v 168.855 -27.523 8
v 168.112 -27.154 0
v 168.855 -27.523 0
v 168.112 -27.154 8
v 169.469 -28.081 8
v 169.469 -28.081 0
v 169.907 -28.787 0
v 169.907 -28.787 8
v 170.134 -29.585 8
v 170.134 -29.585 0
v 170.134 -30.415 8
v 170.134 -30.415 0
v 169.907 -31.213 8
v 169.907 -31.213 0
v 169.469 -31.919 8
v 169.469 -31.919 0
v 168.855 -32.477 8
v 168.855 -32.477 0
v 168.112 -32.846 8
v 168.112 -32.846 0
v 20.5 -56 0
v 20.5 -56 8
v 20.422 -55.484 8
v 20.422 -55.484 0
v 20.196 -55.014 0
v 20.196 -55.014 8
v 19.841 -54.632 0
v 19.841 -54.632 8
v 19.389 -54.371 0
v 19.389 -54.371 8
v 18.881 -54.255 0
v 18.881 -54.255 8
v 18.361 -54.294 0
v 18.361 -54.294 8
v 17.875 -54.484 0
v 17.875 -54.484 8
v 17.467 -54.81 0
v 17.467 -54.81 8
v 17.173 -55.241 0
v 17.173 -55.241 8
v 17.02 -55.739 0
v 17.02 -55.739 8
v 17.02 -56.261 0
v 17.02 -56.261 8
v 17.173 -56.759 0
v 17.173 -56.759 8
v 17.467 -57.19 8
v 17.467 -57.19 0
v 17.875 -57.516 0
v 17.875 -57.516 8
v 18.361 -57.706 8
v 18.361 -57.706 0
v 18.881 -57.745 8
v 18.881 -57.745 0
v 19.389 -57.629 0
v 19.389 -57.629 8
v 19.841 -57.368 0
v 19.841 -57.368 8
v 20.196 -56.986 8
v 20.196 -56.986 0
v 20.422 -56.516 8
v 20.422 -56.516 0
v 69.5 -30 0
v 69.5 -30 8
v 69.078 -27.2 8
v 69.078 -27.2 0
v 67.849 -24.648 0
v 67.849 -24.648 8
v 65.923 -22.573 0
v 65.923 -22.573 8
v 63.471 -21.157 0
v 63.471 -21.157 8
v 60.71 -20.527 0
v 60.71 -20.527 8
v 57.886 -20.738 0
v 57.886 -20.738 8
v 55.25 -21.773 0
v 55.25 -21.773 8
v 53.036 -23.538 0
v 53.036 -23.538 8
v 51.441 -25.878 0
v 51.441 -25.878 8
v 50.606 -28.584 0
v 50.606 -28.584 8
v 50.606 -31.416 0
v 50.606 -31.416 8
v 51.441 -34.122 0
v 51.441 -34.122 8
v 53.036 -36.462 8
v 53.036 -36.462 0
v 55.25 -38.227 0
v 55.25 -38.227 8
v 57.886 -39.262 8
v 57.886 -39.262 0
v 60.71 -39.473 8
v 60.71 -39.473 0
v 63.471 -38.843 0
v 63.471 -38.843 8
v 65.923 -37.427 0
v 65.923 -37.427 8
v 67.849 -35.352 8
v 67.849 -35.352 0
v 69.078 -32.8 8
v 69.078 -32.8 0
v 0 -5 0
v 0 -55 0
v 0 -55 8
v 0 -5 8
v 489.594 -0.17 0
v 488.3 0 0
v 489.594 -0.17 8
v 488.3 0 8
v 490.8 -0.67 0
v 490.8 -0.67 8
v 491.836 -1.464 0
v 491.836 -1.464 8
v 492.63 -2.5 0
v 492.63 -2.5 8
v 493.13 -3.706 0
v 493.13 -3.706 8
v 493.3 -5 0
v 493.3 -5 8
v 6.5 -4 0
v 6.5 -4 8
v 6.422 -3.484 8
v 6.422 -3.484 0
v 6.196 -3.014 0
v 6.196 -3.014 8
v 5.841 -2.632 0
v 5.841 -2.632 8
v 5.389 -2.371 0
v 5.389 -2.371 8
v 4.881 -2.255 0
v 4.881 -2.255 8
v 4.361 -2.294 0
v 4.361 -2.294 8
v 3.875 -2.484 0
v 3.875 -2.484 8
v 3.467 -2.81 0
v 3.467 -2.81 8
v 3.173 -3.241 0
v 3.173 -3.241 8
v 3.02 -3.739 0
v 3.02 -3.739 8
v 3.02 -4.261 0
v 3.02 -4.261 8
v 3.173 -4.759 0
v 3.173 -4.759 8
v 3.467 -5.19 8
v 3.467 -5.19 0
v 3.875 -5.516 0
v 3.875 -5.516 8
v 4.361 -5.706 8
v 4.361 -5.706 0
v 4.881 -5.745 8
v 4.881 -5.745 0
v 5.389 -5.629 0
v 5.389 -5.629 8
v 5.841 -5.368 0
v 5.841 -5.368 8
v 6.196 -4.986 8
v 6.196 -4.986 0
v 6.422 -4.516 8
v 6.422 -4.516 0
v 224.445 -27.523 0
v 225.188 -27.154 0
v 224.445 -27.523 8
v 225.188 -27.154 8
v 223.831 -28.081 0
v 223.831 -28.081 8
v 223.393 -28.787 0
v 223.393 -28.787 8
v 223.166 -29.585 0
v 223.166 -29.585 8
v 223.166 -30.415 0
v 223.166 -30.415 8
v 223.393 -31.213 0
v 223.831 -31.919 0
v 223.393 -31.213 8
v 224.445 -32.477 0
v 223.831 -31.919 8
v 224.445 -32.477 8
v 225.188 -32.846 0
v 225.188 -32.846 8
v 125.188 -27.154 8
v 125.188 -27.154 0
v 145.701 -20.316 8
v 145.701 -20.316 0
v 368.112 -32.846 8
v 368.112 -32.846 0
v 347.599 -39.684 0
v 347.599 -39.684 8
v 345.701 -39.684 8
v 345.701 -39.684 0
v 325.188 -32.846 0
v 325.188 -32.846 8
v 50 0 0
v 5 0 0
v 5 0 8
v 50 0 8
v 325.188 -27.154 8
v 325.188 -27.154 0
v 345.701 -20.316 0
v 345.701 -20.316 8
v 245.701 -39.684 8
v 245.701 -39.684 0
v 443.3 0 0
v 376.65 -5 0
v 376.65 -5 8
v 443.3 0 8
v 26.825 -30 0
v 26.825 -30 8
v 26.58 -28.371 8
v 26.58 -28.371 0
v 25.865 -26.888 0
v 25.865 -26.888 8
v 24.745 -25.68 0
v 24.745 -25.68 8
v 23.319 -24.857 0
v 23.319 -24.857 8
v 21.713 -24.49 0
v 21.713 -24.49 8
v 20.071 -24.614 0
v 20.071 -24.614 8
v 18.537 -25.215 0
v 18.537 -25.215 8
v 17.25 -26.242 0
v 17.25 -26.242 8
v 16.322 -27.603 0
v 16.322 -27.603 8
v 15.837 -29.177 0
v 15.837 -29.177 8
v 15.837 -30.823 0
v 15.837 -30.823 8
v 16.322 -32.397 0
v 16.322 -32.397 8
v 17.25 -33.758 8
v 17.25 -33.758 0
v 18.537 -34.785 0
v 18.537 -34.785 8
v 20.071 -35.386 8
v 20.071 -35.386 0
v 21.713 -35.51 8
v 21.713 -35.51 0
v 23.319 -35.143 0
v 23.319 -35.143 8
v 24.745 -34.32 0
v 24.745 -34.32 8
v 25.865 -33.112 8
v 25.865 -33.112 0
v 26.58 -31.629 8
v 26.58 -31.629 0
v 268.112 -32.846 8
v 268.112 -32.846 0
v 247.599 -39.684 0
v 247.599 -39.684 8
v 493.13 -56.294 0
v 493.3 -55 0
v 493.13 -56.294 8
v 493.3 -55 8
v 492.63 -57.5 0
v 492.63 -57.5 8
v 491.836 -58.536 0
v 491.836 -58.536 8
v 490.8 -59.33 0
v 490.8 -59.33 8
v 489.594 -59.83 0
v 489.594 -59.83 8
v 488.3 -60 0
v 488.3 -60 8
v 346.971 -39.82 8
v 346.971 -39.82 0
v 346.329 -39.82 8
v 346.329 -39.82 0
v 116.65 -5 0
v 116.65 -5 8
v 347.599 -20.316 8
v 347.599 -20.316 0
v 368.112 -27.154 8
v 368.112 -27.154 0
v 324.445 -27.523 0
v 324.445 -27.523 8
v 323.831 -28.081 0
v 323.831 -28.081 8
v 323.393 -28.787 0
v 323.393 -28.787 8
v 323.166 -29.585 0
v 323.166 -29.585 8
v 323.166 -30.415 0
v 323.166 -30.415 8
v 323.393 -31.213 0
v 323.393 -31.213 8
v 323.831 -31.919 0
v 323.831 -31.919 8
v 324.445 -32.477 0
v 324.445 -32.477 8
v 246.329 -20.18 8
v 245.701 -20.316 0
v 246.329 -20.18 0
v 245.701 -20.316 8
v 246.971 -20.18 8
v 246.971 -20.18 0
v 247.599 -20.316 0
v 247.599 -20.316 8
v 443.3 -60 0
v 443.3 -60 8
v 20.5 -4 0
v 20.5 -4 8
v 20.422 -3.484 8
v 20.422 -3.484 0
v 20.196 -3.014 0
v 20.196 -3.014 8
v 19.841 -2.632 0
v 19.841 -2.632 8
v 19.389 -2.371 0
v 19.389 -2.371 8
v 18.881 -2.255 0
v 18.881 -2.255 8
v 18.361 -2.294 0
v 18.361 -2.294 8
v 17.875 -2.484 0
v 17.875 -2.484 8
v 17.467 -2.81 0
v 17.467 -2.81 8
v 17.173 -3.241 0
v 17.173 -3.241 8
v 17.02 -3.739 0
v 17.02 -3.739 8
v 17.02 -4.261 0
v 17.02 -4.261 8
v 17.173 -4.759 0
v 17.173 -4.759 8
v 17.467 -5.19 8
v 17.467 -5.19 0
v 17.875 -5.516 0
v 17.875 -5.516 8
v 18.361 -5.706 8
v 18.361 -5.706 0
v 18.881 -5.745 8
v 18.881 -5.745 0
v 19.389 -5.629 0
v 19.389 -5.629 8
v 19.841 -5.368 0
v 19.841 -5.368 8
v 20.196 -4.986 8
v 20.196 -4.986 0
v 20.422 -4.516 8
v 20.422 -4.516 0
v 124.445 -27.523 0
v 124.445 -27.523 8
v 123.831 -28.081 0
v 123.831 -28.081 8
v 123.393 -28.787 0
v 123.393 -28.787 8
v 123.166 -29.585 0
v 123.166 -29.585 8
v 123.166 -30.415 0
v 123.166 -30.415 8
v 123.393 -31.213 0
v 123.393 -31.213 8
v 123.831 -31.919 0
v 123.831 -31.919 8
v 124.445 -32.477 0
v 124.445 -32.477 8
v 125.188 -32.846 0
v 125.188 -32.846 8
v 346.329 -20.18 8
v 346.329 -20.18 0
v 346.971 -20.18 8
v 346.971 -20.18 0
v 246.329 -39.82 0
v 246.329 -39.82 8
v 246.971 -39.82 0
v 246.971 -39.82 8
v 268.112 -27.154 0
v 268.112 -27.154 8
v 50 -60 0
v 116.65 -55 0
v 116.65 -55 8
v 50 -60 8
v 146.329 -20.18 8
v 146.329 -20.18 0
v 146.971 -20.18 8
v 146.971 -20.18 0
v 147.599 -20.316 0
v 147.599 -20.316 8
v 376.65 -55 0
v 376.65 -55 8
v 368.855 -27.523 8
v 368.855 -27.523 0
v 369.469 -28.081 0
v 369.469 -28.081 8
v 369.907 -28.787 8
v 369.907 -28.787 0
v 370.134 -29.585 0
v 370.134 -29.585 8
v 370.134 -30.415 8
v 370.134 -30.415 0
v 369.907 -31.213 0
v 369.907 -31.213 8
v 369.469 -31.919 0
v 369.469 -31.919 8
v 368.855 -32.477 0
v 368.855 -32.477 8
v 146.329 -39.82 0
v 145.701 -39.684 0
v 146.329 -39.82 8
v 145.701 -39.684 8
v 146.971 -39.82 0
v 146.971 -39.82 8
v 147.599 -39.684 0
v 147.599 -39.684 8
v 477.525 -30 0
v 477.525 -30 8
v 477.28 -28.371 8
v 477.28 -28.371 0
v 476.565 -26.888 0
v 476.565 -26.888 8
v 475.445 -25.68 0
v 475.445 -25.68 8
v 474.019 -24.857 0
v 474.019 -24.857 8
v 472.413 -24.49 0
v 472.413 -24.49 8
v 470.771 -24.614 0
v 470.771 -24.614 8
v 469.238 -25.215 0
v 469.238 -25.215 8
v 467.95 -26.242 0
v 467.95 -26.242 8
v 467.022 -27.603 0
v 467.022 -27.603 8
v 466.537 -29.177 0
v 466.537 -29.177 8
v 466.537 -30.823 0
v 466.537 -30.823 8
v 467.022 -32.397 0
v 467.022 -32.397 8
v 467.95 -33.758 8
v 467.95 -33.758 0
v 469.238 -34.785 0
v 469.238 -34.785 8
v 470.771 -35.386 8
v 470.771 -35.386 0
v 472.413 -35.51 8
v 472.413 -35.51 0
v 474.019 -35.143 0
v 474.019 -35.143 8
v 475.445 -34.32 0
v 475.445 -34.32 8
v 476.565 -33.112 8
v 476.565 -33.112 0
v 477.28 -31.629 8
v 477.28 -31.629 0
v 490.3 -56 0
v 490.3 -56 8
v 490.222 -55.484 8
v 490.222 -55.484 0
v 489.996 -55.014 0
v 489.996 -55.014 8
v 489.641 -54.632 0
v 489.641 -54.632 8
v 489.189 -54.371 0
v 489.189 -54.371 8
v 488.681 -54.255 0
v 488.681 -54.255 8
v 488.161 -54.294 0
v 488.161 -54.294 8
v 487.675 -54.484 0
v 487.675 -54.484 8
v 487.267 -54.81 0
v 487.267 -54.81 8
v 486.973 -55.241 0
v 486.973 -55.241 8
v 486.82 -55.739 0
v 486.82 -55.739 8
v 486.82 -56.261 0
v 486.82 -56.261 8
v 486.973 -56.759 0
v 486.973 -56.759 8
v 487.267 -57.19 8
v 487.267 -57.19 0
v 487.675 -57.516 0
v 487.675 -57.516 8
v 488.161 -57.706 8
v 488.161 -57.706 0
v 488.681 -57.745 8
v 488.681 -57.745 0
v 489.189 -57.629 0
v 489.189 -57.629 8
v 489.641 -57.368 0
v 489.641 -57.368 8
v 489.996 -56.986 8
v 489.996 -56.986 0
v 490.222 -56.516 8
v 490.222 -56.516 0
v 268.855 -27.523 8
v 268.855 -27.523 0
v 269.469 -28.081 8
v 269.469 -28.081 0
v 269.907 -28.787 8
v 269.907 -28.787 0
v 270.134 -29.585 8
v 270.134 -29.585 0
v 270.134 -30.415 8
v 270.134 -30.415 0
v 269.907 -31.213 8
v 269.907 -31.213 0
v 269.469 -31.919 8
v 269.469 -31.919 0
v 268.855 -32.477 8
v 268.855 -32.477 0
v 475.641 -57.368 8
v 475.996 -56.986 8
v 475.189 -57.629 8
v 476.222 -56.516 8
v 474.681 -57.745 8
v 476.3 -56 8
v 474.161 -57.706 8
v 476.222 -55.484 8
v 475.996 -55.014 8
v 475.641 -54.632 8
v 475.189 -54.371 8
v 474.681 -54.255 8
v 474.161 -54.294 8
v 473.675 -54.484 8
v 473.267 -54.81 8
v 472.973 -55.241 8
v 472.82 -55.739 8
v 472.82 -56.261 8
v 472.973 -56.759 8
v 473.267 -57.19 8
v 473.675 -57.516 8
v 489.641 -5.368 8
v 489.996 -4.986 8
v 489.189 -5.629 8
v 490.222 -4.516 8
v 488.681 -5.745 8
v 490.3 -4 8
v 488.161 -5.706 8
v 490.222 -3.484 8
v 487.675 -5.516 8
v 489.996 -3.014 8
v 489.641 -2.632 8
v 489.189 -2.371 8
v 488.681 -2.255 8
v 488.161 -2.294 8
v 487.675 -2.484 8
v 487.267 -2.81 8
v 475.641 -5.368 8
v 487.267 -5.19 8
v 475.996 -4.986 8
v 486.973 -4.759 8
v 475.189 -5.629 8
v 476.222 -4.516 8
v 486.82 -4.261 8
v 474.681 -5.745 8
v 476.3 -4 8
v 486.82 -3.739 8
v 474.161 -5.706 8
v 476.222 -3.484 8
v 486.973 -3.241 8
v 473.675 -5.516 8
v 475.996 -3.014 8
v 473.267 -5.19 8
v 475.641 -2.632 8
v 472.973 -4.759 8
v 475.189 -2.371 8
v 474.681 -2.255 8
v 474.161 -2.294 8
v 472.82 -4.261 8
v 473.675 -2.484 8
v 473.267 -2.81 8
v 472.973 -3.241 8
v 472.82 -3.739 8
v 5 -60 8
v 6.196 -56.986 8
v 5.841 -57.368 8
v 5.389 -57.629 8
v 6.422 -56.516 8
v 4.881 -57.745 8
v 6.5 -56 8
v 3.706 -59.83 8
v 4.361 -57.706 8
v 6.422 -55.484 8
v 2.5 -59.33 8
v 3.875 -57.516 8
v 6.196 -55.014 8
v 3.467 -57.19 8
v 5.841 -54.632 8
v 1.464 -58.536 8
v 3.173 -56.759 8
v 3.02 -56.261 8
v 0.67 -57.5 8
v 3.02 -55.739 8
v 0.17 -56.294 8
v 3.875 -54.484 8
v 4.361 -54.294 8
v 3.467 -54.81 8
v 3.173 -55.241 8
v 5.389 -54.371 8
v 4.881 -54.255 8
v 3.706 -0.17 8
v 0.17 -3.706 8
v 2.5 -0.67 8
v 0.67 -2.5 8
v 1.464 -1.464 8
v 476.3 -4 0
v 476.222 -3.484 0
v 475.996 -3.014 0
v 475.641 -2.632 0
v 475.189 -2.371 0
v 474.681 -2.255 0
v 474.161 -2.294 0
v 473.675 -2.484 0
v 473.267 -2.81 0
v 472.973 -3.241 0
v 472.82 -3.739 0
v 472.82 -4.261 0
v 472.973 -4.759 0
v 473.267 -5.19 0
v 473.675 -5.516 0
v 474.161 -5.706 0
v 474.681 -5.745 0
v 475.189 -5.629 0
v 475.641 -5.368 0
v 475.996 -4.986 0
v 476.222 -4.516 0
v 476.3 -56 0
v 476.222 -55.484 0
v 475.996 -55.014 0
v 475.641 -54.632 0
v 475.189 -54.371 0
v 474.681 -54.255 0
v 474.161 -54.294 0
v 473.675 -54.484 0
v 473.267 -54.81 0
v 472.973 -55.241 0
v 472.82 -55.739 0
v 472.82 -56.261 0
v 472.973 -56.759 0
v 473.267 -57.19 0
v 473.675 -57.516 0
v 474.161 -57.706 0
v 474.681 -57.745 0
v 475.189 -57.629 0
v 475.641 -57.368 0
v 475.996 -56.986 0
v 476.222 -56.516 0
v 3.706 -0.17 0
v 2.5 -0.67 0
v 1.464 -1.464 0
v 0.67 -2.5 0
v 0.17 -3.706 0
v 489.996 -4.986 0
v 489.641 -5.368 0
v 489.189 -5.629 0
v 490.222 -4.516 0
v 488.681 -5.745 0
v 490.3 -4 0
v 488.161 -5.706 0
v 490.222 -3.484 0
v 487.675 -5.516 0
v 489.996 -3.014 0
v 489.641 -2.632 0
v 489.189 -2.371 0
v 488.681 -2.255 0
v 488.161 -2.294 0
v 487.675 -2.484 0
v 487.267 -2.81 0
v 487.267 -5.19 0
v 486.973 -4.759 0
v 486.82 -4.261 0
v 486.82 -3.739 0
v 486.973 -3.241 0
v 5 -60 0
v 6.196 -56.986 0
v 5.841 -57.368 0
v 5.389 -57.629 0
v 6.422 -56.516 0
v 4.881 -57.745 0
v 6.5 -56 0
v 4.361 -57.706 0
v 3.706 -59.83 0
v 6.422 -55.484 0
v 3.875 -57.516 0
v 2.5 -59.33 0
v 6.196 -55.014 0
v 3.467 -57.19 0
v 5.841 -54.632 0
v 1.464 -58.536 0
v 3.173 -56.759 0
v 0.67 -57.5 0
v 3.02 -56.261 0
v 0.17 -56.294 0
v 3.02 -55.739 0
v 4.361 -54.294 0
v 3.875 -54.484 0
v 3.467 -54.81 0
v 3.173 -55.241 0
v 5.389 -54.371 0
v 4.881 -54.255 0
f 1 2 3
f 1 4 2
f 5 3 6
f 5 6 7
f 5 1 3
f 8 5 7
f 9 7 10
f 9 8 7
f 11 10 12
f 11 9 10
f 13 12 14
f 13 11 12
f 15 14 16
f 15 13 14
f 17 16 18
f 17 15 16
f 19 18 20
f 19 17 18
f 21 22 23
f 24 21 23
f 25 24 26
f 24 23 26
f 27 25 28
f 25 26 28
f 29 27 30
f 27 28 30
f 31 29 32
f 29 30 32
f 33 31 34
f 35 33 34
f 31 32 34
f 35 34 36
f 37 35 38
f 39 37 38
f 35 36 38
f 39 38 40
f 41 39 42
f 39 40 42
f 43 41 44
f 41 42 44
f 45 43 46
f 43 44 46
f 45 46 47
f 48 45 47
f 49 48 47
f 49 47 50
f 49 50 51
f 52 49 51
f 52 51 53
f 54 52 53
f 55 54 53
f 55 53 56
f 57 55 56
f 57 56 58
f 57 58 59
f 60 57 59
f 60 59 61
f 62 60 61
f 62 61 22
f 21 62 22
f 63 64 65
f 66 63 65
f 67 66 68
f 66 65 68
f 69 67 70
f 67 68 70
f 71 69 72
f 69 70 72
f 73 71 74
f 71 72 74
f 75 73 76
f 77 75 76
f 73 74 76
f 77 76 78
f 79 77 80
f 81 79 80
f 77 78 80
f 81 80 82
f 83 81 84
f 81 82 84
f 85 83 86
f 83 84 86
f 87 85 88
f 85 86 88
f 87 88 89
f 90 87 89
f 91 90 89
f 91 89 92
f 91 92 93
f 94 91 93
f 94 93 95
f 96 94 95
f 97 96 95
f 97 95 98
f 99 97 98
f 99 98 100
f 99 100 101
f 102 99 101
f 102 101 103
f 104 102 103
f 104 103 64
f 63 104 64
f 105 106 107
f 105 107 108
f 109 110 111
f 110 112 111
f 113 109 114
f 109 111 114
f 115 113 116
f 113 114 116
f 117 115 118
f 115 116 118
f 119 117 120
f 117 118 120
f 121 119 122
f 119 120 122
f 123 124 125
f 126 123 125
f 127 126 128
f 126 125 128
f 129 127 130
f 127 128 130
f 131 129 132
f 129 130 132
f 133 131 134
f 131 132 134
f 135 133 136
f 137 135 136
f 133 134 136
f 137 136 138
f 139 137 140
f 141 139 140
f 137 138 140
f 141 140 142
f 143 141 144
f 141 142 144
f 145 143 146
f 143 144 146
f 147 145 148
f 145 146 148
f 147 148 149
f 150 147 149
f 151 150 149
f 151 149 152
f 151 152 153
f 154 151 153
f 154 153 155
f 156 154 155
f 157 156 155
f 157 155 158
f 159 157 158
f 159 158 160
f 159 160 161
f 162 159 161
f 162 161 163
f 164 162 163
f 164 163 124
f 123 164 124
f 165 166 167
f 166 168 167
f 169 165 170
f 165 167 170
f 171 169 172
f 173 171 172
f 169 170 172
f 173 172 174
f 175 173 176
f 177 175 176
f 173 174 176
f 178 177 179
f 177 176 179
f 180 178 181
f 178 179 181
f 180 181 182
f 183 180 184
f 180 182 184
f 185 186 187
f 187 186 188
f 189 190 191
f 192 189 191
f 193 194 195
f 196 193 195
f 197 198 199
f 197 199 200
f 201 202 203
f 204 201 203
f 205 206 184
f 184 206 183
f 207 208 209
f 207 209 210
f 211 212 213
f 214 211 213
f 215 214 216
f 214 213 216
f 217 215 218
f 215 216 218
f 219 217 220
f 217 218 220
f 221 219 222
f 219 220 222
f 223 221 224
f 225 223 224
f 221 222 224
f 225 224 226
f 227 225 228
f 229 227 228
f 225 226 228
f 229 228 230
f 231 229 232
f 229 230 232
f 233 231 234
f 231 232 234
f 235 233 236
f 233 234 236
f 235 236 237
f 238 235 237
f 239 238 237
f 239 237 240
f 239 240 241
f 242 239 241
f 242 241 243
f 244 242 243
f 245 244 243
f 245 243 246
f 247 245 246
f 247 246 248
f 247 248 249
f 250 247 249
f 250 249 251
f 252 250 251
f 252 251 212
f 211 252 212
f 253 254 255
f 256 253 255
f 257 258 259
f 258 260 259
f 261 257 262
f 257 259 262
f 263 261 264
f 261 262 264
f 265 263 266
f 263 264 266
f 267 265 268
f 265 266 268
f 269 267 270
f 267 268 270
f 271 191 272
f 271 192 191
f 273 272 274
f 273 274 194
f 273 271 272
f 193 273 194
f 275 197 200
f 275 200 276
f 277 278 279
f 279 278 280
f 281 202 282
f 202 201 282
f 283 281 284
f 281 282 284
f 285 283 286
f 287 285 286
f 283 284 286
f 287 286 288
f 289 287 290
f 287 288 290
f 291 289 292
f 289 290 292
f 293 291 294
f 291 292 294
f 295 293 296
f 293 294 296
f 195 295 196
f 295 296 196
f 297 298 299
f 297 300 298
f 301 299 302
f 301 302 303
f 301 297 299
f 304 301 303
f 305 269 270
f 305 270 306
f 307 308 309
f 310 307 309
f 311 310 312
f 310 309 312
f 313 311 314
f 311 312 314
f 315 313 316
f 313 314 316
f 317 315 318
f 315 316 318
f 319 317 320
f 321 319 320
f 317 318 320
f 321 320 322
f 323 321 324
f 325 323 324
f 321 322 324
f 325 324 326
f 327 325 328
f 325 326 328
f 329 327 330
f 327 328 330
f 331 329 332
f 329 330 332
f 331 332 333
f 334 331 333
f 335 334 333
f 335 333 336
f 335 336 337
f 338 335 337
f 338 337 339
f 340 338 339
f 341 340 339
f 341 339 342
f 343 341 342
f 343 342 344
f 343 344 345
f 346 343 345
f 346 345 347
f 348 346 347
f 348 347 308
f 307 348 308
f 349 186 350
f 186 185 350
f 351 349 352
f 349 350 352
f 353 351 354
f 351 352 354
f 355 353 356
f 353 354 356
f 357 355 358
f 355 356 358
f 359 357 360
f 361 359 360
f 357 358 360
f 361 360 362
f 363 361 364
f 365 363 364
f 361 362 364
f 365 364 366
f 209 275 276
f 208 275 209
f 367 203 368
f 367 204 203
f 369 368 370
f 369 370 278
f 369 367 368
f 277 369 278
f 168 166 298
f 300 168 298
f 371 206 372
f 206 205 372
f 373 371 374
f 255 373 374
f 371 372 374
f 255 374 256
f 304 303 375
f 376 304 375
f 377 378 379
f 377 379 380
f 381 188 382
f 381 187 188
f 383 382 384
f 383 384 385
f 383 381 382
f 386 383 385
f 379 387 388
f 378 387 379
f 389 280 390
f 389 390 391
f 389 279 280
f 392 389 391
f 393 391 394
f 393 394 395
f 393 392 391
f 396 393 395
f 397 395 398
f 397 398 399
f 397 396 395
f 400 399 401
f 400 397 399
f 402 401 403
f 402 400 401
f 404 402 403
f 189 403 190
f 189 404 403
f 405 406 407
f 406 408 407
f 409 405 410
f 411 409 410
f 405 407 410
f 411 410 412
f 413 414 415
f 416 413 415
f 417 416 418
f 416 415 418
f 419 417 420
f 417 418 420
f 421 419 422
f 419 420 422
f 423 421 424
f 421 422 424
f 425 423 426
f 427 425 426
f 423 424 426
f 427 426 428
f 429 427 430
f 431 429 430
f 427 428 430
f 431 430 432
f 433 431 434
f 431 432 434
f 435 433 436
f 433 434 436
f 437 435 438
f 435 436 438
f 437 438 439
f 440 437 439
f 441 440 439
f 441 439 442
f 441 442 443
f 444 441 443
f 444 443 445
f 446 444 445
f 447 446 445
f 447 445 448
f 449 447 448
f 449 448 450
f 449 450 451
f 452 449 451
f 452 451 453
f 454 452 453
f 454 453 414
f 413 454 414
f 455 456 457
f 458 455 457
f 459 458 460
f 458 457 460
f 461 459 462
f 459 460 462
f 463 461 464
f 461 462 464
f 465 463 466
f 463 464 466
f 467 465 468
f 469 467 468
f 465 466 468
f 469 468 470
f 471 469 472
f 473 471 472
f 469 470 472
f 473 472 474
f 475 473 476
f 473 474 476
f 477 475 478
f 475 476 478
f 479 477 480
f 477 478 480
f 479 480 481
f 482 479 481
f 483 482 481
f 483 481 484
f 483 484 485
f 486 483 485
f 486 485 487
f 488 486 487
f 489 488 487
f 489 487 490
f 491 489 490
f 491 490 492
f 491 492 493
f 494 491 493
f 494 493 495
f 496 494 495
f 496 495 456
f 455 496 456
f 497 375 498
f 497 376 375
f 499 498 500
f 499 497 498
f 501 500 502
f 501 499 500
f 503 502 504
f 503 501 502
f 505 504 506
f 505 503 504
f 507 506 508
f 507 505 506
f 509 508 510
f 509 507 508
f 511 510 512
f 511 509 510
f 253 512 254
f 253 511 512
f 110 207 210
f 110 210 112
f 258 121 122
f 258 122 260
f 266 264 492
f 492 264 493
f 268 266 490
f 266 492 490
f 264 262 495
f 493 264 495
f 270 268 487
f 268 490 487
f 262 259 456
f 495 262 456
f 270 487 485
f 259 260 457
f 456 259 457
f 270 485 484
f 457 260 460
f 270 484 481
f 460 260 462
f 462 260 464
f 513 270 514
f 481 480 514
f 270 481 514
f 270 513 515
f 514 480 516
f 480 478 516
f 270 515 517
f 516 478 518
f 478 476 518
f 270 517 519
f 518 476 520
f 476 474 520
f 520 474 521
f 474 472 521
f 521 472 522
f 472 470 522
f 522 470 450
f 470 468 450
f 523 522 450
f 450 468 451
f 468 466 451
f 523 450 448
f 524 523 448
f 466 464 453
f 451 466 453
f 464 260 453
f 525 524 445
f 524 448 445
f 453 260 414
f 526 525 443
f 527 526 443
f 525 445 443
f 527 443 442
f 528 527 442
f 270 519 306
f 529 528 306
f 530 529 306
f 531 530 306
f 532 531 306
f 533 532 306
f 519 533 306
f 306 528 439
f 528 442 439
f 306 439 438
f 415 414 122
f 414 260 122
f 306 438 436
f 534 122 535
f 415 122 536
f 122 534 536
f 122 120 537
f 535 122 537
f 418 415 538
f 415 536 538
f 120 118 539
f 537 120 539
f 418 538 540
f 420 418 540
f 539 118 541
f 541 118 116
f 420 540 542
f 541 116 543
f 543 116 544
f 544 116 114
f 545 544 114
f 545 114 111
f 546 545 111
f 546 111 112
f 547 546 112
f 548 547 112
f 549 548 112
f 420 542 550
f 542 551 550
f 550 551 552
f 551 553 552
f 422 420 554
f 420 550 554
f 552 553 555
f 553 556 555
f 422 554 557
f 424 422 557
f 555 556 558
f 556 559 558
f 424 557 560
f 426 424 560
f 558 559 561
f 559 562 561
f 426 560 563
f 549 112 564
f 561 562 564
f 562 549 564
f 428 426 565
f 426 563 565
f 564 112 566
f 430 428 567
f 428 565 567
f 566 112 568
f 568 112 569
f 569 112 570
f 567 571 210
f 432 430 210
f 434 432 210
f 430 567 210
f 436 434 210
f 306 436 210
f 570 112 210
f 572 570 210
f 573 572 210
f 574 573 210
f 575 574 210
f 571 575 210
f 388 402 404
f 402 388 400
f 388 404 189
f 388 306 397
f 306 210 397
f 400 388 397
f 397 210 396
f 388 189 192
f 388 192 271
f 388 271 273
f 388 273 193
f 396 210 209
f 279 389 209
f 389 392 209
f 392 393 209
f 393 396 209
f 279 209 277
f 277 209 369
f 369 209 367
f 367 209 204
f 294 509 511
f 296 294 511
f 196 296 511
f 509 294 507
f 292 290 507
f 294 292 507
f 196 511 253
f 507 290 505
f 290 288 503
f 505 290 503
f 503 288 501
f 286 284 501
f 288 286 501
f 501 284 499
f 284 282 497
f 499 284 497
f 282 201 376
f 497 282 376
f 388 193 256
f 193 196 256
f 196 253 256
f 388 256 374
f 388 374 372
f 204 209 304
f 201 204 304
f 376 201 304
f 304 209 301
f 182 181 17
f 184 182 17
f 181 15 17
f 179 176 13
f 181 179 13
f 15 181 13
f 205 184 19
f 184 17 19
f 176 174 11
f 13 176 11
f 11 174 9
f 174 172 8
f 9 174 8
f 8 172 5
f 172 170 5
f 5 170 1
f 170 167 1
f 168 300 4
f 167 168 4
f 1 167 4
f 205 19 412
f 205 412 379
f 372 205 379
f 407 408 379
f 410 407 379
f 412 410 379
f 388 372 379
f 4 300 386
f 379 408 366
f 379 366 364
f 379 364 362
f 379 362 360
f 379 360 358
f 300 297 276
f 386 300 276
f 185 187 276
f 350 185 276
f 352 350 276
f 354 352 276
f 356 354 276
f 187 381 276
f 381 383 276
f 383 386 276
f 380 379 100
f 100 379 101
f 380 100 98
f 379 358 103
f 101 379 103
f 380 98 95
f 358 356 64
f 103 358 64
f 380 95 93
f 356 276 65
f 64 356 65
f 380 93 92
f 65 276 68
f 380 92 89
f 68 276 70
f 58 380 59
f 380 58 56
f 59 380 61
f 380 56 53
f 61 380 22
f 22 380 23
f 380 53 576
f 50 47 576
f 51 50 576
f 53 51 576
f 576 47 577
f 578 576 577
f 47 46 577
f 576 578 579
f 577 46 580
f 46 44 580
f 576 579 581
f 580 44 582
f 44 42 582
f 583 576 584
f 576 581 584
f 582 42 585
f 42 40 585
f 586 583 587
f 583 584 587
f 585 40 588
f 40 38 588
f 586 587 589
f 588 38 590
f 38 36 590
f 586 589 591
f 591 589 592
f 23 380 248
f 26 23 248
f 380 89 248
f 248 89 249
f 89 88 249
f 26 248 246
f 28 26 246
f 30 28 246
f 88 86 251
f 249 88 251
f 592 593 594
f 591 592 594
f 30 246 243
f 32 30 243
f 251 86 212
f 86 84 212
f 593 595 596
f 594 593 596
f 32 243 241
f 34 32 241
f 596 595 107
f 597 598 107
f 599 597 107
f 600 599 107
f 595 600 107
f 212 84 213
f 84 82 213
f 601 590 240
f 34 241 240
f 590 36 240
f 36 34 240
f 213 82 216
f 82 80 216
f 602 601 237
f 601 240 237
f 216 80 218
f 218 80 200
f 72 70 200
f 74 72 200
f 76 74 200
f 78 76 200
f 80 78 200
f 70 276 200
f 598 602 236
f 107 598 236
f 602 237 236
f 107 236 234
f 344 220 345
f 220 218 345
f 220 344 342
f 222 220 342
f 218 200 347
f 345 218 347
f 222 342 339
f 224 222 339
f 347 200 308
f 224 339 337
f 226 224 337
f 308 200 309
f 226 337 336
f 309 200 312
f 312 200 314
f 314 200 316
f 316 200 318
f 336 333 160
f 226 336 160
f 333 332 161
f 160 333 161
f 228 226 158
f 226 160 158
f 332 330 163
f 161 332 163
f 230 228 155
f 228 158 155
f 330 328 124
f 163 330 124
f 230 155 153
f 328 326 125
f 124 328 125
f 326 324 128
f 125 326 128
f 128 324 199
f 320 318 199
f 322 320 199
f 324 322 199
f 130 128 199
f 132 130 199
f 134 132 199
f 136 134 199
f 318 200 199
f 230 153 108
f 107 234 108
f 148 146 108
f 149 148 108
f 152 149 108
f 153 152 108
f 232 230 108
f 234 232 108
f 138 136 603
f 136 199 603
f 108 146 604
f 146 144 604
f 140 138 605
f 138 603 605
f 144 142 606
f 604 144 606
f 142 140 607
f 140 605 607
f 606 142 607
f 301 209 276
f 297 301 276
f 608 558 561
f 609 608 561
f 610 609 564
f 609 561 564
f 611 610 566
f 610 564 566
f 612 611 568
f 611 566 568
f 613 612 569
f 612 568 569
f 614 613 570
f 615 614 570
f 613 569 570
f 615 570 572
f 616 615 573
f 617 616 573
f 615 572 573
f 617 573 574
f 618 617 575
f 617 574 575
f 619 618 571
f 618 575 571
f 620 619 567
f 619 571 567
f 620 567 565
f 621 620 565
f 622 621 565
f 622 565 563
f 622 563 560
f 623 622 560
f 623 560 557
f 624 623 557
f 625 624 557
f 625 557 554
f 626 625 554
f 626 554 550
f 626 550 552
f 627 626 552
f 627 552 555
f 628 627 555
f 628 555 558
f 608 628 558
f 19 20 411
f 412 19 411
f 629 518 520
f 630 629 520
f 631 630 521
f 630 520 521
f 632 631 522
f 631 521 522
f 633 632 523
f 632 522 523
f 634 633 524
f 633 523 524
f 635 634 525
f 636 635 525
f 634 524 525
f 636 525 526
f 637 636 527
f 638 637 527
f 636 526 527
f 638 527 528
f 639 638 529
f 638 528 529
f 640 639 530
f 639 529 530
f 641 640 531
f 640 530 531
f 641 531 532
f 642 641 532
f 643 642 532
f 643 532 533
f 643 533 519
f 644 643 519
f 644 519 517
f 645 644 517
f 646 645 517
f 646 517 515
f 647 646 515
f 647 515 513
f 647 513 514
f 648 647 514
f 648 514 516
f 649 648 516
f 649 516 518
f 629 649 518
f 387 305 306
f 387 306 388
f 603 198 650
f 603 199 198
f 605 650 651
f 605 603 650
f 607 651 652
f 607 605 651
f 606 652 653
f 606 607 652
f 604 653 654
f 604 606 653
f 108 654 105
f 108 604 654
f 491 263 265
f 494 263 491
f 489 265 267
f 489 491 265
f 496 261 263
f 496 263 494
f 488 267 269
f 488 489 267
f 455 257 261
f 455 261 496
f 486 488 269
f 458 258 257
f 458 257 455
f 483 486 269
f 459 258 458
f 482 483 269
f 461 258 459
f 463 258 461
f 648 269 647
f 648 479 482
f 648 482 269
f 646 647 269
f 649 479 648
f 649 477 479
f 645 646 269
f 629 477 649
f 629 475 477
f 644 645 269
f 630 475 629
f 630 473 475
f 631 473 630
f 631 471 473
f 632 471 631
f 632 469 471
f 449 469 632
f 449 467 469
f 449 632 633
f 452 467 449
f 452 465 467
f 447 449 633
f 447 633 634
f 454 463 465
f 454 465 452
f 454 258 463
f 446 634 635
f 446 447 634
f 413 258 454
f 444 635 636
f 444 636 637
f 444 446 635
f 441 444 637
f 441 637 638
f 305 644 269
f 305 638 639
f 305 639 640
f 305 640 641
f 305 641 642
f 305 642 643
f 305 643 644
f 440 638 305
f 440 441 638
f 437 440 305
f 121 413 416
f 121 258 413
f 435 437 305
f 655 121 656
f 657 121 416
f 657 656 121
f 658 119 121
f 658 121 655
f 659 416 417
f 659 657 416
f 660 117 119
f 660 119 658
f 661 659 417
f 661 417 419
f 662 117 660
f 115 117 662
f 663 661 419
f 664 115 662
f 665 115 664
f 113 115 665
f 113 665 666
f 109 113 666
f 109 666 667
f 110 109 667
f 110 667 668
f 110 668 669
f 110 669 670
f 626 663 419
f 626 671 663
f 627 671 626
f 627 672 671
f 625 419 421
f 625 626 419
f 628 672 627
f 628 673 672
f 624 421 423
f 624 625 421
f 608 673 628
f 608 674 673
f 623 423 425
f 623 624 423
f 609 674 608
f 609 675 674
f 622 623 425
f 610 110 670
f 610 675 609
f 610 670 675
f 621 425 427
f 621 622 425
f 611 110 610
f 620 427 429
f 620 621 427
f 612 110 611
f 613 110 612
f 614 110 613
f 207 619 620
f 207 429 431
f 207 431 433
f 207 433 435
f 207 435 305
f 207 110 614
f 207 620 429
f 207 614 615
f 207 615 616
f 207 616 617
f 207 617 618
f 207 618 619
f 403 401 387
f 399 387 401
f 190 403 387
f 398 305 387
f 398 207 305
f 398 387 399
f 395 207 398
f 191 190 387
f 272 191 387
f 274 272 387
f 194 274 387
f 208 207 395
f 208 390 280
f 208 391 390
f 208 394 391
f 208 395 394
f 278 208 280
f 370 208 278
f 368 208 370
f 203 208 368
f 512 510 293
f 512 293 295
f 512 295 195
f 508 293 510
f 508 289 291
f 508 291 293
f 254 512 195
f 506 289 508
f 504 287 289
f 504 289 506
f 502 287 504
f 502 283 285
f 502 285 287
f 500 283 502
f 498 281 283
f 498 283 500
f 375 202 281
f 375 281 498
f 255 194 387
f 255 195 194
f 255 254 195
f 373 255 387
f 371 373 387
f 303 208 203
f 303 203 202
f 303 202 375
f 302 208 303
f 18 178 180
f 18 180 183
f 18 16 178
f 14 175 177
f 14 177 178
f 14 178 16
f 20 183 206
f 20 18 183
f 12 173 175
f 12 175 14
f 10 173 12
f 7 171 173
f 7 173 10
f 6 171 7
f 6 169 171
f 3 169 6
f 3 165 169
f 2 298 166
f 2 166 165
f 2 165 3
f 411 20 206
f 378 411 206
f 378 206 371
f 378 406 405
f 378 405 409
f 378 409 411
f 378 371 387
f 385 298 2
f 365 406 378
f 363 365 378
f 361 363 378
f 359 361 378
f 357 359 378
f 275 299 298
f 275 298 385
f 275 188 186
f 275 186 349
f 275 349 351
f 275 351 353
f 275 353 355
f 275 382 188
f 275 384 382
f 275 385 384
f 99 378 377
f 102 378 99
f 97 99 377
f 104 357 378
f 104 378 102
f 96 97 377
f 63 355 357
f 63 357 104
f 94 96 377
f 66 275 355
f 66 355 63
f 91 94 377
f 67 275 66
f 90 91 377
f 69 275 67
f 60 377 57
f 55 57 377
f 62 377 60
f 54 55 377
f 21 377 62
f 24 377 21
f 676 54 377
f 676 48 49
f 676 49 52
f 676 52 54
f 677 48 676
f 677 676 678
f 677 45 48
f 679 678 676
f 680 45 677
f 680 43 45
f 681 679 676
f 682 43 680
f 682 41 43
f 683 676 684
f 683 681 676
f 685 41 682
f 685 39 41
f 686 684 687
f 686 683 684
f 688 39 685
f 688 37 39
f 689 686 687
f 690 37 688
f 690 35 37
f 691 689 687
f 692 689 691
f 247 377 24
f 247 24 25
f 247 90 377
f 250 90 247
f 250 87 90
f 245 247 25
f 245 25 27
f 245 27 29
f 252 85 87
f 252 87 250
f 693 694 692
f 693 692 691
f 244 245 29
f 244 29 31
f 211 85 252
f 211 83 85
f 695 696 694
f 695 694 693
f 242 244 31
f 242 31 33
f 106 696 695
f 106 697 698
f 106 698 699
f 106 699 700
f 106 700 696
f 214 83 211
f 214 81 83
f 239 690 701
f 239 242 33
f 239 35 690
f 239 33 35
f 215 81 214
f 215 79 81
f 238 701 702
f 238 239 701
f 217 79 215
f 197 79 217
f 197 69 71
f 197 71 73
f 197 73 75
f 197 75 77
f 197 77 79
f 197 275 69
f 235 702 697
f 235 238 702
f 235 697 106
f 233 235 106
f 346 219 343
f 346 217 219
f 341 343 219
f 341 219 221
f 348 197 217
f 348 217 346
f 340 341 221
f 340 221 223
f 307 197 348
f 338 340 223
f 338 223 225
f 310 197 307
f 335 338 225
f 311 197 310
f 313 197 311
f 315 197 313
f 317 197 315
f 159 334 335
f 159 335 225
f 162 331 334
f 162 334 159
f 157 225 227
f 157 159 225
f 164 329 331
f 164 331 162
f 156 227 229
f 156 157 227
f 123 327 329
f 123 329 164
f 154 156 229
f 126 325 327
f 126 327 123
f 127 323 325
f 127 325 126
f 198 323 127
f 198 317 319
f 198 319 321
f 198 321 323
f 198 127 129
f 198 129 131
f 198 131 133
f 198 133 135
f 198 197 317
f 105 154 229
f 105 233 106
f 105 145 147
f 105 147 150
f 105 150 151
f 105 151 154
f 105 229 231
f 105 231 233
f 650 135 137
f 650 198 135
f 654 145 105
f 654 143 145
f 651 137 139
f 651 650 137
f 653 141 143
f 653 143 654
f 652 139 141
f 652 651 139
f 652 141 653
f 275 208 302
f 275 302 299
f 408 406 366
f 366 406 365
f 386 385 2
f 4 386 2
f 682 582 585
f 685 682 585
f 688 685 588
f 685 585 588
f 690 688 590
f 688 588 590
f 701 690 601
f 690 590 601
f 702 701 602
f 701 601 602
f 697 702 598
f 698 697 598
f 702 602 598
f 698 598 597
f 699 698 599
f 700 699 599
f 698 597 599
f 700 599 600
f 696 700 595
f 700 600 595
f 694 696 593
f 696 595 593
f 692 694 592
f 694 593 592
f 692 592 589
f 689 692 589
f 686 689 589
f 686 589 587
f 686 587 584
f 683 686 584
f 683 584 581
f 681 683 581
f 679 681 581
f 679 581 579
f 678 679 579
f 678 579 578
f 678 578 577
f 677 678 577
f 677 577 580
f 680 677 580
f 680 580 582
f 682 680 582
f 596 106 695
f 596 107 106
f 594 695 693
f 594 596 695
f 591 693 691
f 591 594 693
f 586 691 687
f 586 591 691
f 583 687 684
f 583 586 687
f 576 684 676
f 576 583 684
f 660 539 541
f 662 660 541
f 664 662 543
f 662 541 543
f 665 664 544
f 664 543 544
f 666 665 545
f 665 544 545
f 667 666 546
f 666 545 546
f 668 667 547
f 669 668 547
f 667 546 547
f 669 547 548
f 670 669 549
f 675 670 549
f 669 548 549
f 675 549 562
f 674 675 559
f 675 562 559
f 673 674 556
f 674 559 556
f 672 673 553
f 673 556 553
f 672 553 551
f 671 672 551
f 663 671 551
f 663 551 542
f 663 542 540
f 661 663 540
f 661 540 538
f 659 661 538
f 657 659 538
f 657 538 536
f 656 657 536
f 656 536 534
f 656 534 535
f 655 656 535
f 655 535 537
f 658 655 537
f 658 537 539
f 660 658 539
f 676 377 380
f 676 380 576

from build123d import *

# Parameters (mm, degrees)
EXTRUDE_1_DEPTH     = 8
FILLET_1_R          = 3
FILLET_2_R          = 5
SKETCH_2_R          = 1.75
SKETCH_2_R_2        = 5.525
CUT_EXTRUDE_1_DEPTH = 10
SKETCH_3_R          = 9.5
CUT_EXTRUDE_2_DEPTH = 497.999889336


with BuildPart() as part:
    # 草图1 → 凸台-拉伸1 (new body)
    with BuildSketch(Plane.XY):
        Polygon((0, 0), (50, 0), (116.65, -5), (376.65, -5), (443.3, 0), (493.3, 0), (493.3, -60), (443.3, -60), (376.65, -55), (116.65, -55), (50, -60), (0, -60), align=None)
        Polygon((116.65, -30), (146.65, -20), (176.65, -30), (146.65, -40), align=None, mode=Mode.SUBTRACT)
        Polygon((216.65, -30), (246.65, -20), (276.65, -30), (246.65, -40), align=None, mode=Mode.SUBTRACT)
        Polygon((316.65, -30), (346.65, -20), (376.65, -30), (346.65, -40), align=None, mode=Mode.SUBTRACT)
    extrude(amount=EXTRUDE_1_DEPTH)

    # 圆角1
    fillet_1_edges = [part.edges().sort_by_distance(p)[0] for p in [
        (216.65, -30, 4),
        (246.65, -40, 4),
        (276.65, -30, 4),
        (246.65, -20, 4),
        (116.65, -30, 4),
        (146.65, -40, 4),
        (176.65, -30, 4),
        (146.65, -20, 4),
        (316.65, -30, 4),
        (346.65, -40, 4),
        (376.65, -30, 4),
        (346.65, -20, 4),
    ]]
    fillet(fillet_1_edges, radius=FILLET_1_R)

    # 圆角2
    fillet_2_edges = [part.edges().sort_by_distance(p)[0] for p in [
        (0, 0, 4),
        (493.3, 0, 4),
        (493.3, -60, 4),
        (0, -60, 4),
    ]]
    fillet(fillet_2_edges, radius=FILLET_2_R)

    # 草图2 → 切除-拉伸1 (cut)
    with BuildSketch(Plane.XY.offset(8)):
        with Locations((4.75, -4)):
            Circle(SKETCH_2_R)
        with Locations((18.75, -4)):
            Circle(SKETCH_2_R)
        with Locations((18.75, -56)):
            Circle(SKETCH_2_R)
        with Locations((4.75, -56)):
            Circle(SKETCH_2_R)
        with Locations((21.3, -30)):
            Circle(SKETCH_2_R_2)
        with Locations((488.55, -4)):
            Circle(SKETCH_2_R)
        with Locations((474.55, -4)):
            Circle(SKETCH_2_R)
        with Locations((474.55, -56)):
            Circle(SKETCH_2_R)
        with Locations((488.55, -56)):
            Circle(SKETCH_2_R)
        with Locations((472, -30)):
            Circle(SKETCH_2_R_2)
    extrude(amount=-CUT_EXTRUDE_1_DEPTH, mode=Mode.SUBTRACT)

    # 草图3 → 切除-拉伸2 (cut, through all)
    with BuildSketch(Plane.XY.offset(8)):
        with Locations((60, -30)):
            Circle(SKETCH_3_R)
    extrude(amount=-CUT_EXTRUDE_2_DEPTH, mode=Mode.SUBTRACT)


solid = part.part
